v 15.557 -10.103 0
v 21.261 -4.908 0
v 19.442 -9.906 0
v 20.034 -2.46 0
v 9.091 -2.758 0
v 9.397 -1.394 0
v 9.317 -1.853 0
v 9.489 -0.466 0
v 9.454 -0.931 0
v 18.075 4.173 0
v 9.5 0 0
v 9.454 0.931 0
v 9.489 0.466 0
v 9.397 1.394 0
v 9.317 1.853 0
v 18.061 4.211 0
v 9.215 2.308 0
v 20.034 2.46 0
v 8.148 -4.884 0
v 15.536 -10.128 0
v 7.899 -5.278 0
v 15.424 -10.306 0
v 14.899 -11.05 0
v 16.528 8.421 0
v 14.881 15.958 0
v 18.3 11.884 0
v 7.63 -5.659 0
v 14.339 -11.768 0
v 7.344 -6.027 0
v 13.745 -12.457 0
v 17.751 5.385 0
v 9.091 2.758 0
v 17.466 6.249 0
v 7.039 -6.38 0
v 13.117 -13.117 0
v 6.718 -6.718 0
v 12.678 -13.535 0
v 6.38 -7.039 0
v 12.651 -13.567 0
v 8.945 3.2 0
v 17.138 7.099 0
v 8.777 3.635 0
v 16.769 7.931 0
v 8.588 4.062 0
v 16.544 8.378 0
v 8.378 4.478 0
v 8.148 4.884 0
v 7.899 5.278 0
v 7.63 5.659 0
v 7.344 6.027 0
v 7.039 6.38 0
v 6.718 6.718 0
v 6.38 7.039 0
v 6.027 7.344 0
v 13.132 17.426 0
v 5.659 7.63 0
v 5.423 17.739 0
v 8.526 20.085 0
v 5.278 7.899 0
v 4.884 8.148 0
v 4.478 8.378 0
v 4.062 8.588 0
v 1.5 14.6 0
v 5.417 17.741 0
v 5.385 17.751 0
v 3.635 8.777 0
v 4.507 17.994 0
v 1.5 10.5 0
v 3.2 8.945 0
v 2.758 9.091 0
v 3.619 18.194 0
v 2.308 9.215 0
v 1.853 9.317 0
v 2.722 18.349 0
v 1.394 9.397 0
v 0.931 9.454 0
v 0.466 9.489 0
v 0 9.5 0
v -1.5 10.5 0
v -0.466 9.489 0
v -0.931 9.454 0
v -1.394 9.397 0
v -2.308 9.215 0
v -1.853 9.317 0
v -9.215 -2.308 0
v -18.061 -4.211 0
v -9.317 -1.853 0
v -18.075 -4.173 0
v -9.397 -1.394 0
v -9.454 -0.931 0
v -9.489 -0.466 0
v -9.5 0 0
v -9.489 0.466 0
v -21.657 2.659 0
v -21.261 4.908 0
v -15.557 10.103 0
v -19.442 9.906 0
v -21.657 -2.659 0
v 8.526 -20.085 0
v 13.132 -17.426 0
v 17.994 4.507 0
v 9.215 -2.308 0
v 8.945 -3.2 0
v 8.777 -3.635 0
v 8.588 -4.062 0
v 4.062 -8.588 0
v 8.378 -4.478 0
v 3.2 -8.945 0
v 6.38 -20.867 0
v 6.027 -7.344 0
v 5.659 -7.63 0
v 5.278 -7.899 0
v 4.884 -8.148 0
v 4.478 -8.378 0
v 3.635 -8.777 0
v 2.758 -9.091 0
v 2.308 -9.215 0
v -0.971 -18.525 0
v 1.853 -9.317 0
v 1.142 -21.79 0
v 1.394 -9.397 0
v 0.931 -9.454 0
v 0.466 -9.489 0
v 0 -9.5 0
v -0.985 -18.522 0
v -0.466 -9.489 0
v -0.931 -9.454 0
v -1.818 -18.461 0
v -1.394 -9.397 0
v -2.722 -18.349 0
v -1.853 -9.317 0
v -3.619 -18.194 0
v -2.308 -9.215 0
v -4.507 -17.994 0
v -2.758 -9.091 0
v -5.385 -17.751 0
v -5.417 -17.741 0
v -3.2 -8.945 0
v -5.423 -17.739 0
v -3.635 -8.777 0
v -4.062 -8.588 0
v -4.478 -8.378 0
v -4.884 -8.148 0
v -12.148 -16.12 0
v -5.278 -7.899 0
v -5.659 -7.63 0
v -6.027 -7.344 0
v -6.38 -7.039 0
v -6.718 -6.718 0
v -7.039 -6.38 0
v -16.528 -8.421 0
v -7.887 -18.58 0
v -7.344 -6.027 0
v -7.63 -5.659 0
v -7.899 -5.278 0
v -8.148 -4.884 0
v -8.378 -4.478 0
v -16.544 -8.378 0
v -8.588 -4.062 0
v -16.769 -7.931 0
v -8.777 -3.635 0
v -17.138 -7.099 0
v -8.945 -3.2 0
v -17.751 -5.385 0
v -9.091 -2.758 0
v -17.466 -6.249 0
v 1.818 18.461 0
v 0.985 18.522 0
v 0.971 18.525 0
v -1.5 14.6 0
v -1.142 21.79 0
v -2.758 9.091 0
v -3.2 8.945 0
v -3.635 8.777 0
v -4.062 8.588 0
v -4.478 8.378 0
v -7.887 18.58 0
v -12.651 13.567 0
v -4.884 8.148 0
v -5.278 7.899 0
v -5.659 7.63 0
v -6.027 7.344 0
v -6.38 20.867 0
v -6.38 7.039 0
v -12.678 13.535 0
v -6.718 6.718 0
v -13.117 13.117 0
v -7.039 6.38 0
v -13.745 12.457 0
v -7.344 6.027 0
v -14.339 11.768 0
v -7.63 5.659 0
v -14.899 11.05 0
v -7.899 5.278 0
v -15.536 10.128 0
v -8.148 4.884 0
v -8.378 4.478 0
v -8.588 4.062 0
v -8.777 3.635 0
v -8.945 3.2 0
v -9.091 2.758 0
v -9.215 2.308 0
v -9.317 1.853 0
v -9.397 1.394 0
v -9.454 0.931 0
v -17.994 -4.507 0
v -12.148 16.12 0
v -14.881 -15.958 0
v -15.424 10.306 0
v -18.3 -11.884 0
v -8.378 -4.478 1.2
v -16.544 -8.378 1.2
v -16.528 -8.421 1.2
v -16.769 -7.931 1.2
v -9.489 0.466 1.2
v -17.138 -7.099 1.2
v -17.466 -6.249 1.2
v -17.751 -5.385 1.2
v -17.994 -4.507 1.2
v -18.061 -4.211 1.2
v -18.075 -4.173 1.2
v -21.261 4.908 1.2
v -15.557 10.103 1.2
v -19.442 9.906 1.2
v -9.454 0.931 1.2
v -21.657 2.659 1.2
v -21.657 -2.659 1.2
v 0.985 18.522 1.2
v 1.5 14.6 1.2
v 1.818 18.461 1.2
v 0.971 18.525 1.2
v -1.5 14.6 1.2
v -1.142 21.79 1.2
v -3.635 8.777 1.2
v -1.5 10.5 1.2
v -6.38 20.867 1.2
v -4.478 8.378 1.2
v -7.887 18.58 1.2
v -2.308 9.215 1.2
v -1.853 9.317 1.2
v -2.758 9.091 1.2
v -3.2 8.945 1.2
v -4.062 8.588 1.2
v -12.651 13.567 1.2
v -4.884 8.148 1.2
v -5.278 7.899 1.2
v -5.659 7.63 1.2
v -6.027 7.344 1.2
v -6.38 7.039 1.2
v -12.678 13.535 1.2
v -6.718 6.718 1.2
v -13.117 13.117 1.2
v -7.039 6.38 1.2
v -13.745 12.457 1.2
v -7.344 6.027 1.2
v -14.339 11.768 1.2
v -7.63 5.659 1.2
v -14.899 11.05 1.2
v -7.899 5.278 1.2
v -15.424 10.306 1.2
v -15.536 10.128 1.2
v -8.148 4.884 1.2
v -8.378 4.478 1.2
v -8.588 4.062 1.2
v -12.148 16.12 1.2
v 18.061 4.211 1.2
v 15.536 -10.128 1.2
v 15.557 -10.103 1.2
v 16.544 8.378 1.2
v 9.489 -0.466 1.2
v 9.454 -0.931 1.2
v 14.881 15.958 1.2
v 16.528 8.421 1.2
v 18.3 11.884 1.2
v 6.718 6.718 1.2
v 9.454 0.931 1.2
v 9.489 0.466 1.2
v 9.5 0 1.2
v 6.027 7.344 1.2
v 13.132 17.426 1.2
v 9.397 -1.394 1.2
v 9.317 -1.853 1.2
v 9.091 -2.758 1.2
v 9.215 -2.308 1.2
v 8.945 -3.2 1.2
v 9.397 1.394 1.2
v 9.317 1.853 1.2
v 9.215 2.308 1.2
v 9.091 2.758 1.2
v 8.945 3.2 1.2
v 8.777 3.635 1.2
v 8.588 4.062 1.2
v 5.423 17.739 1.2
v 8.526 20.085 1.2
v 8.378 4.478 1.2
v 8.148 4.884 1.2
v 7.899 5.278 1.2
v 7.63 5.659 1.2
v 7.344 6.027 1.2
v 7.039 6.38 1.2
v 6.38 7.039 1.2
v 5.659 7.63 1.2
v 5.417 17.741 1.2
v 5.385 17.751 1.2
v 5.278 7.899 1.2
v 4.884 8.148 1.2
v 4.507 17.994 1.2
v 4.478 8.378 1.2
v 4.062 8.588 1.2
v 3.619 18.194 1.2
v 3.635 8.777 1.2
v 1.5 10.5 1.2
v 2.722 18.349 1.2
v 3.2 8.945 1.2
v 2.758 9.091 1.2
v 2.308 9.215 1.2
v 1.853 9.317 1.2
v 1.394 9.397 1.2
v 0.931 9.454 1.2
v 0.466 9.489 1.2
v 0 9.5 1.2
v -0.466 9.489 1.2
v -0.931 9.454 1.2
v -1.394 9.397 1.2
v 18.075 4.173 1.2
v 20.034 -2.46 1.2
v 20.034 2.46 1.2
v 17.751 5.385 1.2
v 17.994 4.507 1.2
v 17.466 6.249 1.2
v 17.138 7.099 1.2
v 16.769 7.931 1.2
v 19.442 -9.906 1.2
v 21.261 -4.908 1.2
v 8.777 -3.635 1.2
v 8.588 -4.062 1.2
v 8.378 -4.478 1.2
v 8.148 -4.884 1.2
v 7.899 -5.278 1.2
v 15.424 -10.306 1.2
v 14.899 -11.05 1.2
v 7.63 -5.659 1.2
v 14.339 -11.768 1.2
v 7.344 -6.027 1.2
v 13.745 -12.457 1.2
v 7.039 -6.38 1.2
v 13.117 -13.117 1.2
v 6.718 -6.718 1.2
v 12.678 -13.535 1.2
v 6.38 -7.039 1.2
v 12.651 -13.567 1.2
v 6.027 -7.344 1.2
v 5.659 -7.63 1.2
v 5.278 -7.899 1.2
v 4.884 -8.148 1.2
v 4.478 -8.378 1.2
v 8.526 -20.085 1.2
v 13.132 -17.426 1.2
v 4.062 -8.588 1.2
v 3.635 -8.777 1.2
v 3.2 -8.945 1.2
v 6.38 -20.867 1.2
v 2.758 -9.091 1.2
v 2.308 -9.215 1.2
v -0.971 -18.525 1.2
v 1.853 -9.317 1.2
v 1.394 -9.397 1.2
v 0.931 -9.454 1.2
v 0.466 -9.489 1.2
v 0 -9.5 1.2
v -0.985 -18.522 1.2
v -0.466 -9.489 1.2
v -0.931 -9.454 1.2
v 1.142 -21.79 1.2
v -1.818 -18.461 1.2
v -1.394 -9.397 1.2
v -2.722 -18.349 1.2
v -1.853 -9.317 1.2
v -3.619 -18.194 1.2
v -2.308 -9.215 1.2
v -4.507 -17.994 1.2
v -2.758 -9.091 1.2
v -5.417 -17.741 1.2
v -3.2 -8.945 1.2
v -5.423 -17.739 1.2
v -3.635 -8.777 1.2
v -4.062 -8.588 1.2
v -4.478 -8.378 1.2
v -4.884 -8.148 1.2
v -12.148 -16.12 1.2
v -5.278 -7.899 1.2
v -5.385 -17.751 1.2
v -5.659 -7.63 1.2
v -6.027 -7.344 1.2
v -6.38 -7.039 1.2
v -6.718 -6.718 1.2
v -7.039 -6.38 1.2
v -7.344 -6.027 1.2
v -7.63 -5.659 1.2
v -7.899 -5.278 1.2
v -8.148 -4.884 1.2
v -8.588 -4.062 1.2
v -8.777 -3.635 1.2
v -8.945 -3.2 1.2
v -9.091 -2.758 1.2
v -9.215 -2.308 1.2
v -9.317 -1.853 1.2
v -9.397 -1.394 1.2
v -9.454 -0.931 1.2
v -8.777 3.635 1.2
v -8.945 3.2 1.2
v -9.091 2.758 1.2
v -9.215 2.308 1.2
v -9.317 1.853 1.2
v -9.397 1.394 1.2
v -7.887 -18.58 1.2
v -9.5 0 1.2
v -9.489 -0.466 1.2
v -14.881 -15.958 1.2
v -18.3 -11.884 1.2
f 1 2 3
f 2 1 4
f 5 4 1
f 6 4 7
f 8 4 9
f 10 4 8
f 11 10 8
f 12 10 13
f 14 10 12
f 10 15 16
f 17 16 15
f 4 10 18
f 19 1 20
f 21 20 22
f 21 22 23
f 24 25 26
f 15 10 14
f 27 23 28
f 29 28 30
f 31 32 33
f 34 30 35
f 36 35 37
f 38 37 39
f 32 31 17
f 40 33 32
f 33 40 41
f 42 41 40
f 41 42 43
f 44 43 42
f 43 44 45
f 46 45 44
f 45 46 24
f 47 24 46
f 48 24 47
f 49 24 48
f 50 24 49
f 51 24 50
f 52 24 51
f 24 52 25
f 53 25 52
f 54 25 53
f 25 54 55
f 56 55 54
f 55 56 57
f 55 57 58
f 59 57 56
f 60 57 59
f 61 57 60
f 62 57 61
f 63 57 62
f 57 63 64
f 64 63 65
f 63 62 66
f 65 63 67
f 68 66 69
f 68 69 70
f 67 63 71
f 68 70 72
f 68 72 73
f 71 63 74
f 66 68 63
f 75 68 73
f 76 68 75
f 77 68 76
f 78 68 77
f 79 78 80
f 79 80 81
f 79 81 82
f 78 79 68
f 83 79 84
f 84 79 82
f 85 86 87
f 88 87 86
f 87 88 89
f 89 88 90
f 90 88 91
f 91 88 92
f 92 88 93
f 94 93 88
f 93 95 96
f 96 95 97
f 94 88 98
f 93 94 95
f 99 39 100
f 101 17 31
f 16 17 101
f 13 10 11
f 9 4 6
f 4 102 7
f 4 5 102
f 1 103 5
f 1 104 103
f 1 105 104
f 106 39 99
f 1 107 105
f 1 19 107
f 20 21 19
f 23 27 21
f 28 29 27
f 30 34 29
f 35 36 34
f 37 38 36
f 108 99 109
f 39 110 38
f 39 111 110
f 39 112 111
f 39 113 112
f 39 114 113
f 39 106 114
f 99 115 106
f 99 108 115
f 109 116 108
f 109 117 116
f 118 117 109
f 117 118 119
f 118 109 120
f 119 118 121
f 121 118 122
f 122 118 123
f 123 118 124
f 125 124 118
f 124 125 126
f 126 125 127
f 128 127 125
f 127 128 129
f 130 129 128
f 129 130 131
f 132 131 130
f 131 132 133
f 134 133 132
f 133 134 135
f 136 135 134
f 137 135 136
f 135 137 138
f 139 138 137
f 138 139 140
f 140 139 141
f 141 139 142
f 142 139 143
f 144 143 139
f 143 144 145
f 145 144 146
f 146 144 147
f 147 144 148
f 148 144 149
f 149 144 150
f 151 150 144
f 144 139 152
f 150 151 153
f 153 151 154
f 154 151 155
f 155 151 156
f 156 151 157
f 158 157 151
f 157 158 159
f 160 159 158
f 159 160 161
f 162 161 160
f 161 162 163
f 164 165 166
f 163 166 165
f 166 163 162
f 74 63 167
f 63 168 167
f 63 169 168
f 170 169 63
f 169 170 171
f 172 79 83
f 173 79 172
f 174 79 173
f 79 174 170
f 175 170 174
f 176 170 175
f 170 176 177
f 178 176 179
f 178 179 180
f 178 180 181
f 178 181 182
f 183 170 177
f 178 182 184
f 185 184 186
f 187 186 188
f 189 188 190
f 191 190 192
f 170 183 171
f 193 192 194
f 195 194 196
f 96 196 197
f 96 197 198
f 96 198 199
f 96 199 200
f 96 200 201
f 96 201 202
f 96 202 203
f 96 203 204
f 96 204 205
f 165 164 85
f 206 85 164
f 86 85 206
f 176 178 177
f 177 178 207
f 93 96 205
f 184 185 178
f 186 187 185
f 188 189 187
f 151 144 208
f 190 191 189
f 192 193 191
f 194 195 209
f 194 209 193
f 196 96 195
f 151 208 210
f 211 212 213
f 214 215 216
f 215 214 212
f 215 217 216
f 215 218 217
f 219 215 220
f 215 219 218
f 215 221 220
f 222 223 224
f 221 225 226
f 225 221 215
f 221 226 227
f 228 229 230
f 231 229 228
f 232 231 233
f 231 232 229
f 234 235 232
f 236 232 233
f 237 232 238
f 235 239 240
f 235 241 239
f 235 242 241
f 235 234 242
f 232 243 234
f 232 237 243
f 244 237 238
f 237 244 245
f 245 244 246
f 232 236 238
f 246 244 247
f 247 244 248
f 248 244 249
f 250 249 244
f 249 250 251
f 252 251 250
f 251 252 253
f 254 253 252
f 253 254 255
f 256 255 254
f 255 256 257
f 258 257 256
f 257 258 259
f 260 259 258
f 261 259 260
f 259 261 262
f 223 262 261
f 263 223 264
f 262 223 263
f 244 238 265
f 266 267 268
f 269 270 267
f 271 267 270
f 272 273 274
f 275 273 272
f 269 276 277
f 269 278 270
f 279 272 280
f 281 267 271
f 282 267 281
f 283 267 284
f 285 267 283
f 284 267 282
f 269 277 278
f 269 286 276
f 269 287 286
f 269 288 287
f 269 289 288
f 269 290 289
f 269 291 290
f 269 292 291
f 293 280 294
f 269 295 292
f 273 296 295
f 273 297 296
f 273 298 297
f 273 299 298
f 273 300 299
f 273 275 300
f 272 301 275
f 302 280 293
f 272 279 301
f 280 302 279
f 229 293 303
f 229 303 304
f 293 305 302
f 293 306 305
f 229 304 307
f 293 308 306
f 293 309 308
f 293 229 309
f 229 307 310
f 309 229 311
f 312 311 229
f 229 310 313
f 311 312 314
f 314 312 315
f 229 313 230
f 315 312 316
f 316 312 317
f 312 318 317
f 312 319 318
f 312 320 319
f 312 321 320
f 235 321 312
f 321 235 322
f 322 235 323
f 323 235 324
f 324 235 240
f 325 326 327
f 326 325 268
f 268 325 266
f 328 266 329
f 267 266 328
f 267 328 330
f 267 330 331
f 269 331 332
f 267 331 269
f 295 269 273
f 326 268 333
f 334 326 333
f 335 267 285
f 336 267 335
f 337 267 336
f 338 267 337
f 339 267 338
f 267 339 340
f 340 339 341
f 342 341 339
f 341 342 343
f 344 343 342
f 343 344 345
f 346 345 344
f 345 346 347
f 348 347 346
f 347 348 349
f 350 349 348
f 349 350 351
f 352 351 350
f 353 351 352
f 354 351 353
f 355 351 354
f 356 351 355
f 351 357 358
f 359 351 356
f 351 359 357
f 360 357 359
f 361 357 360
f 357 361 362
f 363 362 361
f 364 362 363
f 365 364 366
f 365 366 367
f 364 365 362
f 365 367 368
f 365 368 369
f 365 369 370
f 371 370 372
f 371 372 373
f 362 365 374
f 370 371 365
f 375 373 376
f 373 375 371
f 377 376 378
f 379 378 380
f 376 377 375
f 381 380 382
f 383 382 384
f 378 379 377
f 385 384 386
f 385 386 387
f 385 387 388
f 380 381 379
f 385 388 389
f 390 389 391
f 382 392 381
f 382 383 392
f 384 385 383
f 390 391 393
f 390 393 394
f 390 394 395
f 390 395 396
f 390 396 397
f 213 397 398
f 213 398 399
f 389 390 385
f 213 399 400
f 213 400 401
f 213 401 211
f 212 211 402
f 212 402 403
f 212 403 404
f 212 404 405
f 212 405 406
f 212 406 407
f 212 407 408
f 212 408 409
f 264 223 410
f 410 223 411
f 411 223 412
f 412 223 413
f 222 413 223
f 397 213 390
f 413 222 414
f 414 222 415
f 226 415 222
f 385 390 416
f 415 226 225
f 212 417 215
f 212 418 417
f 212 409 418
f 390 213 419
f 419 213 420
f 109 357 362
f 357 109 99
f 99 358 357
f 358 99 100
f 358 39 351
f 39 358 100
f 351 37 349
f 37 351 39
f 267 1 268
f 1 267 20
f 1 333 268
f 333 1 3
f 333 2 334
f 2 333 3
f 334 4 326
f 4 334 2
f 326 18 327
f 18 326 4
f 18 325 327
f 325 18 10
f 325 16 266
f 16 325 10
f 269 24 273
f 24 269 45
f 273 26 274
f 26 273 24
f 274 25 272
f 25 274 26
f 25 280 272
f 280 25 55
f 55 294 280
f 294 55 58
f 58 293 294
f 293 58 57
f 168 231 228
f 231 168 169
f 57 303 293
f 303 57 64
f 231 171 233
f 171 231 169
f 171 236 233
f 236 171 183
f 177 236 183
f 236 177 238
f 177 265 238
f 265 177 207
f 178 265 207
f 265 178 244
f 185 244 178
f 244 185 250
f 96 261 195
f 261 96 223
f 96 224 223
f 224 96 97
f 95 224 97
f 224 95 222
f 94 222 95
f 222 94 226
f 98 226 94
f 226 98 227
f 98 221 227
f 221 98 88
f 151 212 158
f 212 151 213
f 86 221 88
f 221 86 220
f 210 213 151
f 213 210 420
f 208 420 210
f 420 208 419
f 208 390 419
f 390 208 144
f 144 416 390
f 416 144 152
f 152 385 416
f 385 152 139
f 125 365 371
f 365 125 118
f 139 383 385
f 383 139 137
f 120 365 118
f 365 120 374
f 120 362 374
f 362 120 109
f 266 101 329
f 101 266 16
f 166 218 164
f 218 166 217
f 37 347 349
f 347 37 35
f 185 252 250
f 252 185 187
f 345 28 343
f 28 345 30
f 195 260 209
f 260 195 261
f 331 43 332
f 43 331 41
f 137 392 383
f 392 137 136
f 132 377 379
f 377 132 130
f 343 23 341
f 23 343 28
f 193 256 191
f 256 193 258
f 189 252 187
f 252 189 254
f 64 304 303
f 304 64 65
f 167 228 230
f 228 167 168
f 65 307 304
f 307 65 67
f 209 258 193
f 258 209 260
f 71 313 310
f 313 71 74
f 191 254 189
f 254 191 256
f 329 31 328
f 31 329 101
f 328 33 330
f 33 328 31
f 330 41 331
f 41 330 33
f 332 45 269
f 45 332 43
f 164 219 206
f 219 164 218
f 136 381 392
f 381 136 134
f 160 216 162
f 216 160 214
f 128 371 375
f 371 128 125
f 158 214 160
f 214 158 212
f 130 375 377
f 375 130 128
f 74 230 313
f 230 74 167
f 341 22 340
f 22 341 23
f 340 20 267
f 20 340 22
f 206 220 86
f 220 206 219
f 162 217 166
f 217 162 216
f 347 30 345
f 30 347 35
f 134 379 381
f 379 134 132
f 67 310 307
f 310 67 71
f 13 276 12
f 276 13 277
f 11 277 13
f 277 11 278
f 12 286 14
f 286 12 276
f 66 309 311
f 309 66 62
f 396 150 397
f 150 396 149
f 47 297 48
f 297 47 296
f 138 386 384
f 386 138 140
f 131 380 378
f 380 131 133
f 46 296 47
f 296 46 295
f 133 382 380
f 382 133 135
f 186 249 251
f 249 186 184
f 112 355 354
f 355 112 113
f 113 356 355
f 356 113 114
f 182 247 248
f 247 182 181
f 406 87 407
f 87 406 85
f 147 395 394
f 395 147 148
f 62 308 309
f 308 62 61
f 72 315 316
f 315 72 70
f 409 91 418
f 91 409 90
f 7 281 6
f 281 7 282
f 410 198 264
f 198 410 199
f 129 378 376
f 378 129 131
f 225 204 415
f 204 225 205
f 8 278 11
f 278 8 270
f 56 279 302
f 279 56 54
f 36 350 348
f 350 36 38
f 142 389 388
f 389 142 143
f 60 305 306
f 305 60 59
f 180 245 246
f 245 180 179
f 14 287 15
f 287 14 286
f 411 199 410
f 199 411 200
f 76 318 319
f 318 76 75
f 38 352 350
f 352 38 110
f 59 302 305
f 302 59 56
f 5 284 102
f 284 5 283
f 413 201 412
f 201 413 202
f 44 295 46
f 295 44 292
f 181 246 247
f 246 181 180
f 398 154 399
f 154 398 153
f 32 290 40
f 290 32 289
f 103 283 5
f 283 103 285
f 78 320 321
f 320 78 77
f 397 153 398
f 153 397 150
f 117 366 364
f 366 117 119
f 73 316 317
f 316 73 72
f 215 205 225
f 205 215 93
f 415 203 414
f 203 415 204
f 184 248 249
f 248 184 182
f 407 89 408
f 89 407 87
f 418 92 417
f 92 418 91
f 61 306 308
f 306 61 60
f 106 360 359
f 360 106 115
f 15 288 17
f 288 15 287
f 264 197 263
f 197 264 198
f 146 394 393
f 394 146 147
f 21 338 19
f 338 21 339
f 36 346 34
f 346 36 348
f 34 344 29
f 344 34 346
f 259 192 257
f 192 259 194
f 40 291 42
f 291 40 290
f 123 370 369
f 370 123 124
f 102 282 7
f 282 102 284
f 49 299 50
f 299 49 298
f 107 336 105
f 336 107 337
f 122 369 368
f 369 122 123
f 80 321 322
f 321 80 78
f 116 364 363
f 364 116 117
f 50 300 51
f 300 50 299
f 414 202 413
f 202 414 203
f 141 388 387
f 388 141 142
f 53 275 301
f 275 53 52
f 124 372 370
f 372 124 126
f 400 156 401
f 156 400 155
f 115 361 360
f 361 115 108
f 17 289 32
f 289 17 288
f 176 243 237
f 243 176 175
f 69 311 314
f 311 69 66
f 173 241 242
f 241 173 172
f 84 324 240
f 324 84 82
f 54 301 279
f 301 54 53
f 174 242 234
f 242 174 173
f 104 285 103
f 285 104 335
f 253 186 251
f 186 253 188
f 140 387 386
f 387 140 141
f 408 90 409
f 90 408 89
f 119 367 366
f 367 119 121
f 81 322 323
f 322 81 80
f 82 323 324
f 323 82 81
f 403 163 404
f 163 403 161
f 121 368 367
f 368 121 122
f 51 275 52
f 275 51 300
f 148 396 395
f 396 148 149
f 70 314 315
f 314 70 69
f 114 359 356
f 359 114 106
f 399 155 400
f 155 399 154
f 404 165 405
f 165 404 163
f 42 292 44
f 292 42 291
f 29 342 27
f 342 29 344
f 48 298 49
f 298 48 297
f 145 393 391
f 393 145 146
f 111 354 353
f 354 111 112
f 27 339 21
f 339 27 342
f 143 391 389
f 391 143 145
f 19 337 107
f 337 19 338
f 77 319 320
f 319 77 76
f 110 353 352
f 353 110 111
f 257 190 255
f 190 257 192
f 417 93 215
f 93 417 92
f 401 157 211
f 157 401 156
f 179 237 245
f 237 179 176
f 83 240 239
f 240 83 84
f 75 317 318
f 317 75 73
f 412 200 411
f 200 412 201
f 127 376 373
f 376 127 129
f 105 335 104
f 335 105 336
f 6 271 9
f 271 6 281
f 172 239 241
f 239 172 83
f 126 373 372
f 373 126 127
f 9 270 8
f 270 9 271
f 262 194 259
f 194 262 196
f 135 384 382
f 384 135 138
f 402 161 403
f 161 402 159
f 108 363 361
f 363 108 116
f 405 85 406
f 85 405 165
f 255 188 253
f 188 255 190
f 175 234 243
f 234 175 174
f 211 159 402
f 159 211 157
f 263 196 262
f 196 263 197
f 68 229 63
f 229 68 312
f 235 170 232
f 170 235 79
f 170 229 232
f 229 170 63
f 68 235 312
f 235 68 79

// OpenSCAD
/*
  Elna Supermatic cam 31
  Name: Block sawtooth
  Status: candidate

  Generated from measured parametric base v2.
  Surface mode: stepped
*/

include <_elna_measured_common.scad>;

profile_points = [
        [0.9708, 18.5246],
        [5.4235, 17.7395],
        [8.5258, 20.0854],
        [13.1316, 17.4262],
        [14.8812, 15.9581],
        [18.2998, 11.8840],
        [16.5282, 8.4215],
        [18.0746, 4.1728],
        [20.0345, 2.4599],
        [20.0345, -2.4599],
        [21.2608, -4.9084],
        [19.4418, -9.9061],
        [15.5573, -10.1031],
        [12.6511, -13.5666],
        [13.1316, -17.4262],
        [8.5258, -20.0854],
        [6.3796, -20.8666],
        [1.1420, -21.7901],
        [-0.9708, -18.5246],
        [-5.4235, -17.7395],
        [-7.8869, -18.5804],
        [-12.1476, -16.1205],
        [-14.8812, -15.9581],
        [-18.2998, -11.8840],
        [-16.5282, -8.4215],
        [-18.0746, -4.1728],
        [-21.6574, -2.6592],
        [-21.6574, 2.6592],
        [-21.2608, 4.9084],
        [-19.4418, 9.9061],
        [-15.5573, 10.1031],
        [-12.6511, 13.5666],
        [-12.1476, 16.1205],
        [-7.8869, 18.5804],
        [-6.3796, 20.8666],
        [-1.1420, 21.7901]
];

icon_points = [[-1.000,0.180], [-0.750,0.820], [-0.500,0.180], [-0.250,0.820], [0.000,0.180], [0.250,0.820], [0.500,0.180], [0.750,0.820], [1.000,0.180]];

elna_cam_ring(profile_points=profile_points);
